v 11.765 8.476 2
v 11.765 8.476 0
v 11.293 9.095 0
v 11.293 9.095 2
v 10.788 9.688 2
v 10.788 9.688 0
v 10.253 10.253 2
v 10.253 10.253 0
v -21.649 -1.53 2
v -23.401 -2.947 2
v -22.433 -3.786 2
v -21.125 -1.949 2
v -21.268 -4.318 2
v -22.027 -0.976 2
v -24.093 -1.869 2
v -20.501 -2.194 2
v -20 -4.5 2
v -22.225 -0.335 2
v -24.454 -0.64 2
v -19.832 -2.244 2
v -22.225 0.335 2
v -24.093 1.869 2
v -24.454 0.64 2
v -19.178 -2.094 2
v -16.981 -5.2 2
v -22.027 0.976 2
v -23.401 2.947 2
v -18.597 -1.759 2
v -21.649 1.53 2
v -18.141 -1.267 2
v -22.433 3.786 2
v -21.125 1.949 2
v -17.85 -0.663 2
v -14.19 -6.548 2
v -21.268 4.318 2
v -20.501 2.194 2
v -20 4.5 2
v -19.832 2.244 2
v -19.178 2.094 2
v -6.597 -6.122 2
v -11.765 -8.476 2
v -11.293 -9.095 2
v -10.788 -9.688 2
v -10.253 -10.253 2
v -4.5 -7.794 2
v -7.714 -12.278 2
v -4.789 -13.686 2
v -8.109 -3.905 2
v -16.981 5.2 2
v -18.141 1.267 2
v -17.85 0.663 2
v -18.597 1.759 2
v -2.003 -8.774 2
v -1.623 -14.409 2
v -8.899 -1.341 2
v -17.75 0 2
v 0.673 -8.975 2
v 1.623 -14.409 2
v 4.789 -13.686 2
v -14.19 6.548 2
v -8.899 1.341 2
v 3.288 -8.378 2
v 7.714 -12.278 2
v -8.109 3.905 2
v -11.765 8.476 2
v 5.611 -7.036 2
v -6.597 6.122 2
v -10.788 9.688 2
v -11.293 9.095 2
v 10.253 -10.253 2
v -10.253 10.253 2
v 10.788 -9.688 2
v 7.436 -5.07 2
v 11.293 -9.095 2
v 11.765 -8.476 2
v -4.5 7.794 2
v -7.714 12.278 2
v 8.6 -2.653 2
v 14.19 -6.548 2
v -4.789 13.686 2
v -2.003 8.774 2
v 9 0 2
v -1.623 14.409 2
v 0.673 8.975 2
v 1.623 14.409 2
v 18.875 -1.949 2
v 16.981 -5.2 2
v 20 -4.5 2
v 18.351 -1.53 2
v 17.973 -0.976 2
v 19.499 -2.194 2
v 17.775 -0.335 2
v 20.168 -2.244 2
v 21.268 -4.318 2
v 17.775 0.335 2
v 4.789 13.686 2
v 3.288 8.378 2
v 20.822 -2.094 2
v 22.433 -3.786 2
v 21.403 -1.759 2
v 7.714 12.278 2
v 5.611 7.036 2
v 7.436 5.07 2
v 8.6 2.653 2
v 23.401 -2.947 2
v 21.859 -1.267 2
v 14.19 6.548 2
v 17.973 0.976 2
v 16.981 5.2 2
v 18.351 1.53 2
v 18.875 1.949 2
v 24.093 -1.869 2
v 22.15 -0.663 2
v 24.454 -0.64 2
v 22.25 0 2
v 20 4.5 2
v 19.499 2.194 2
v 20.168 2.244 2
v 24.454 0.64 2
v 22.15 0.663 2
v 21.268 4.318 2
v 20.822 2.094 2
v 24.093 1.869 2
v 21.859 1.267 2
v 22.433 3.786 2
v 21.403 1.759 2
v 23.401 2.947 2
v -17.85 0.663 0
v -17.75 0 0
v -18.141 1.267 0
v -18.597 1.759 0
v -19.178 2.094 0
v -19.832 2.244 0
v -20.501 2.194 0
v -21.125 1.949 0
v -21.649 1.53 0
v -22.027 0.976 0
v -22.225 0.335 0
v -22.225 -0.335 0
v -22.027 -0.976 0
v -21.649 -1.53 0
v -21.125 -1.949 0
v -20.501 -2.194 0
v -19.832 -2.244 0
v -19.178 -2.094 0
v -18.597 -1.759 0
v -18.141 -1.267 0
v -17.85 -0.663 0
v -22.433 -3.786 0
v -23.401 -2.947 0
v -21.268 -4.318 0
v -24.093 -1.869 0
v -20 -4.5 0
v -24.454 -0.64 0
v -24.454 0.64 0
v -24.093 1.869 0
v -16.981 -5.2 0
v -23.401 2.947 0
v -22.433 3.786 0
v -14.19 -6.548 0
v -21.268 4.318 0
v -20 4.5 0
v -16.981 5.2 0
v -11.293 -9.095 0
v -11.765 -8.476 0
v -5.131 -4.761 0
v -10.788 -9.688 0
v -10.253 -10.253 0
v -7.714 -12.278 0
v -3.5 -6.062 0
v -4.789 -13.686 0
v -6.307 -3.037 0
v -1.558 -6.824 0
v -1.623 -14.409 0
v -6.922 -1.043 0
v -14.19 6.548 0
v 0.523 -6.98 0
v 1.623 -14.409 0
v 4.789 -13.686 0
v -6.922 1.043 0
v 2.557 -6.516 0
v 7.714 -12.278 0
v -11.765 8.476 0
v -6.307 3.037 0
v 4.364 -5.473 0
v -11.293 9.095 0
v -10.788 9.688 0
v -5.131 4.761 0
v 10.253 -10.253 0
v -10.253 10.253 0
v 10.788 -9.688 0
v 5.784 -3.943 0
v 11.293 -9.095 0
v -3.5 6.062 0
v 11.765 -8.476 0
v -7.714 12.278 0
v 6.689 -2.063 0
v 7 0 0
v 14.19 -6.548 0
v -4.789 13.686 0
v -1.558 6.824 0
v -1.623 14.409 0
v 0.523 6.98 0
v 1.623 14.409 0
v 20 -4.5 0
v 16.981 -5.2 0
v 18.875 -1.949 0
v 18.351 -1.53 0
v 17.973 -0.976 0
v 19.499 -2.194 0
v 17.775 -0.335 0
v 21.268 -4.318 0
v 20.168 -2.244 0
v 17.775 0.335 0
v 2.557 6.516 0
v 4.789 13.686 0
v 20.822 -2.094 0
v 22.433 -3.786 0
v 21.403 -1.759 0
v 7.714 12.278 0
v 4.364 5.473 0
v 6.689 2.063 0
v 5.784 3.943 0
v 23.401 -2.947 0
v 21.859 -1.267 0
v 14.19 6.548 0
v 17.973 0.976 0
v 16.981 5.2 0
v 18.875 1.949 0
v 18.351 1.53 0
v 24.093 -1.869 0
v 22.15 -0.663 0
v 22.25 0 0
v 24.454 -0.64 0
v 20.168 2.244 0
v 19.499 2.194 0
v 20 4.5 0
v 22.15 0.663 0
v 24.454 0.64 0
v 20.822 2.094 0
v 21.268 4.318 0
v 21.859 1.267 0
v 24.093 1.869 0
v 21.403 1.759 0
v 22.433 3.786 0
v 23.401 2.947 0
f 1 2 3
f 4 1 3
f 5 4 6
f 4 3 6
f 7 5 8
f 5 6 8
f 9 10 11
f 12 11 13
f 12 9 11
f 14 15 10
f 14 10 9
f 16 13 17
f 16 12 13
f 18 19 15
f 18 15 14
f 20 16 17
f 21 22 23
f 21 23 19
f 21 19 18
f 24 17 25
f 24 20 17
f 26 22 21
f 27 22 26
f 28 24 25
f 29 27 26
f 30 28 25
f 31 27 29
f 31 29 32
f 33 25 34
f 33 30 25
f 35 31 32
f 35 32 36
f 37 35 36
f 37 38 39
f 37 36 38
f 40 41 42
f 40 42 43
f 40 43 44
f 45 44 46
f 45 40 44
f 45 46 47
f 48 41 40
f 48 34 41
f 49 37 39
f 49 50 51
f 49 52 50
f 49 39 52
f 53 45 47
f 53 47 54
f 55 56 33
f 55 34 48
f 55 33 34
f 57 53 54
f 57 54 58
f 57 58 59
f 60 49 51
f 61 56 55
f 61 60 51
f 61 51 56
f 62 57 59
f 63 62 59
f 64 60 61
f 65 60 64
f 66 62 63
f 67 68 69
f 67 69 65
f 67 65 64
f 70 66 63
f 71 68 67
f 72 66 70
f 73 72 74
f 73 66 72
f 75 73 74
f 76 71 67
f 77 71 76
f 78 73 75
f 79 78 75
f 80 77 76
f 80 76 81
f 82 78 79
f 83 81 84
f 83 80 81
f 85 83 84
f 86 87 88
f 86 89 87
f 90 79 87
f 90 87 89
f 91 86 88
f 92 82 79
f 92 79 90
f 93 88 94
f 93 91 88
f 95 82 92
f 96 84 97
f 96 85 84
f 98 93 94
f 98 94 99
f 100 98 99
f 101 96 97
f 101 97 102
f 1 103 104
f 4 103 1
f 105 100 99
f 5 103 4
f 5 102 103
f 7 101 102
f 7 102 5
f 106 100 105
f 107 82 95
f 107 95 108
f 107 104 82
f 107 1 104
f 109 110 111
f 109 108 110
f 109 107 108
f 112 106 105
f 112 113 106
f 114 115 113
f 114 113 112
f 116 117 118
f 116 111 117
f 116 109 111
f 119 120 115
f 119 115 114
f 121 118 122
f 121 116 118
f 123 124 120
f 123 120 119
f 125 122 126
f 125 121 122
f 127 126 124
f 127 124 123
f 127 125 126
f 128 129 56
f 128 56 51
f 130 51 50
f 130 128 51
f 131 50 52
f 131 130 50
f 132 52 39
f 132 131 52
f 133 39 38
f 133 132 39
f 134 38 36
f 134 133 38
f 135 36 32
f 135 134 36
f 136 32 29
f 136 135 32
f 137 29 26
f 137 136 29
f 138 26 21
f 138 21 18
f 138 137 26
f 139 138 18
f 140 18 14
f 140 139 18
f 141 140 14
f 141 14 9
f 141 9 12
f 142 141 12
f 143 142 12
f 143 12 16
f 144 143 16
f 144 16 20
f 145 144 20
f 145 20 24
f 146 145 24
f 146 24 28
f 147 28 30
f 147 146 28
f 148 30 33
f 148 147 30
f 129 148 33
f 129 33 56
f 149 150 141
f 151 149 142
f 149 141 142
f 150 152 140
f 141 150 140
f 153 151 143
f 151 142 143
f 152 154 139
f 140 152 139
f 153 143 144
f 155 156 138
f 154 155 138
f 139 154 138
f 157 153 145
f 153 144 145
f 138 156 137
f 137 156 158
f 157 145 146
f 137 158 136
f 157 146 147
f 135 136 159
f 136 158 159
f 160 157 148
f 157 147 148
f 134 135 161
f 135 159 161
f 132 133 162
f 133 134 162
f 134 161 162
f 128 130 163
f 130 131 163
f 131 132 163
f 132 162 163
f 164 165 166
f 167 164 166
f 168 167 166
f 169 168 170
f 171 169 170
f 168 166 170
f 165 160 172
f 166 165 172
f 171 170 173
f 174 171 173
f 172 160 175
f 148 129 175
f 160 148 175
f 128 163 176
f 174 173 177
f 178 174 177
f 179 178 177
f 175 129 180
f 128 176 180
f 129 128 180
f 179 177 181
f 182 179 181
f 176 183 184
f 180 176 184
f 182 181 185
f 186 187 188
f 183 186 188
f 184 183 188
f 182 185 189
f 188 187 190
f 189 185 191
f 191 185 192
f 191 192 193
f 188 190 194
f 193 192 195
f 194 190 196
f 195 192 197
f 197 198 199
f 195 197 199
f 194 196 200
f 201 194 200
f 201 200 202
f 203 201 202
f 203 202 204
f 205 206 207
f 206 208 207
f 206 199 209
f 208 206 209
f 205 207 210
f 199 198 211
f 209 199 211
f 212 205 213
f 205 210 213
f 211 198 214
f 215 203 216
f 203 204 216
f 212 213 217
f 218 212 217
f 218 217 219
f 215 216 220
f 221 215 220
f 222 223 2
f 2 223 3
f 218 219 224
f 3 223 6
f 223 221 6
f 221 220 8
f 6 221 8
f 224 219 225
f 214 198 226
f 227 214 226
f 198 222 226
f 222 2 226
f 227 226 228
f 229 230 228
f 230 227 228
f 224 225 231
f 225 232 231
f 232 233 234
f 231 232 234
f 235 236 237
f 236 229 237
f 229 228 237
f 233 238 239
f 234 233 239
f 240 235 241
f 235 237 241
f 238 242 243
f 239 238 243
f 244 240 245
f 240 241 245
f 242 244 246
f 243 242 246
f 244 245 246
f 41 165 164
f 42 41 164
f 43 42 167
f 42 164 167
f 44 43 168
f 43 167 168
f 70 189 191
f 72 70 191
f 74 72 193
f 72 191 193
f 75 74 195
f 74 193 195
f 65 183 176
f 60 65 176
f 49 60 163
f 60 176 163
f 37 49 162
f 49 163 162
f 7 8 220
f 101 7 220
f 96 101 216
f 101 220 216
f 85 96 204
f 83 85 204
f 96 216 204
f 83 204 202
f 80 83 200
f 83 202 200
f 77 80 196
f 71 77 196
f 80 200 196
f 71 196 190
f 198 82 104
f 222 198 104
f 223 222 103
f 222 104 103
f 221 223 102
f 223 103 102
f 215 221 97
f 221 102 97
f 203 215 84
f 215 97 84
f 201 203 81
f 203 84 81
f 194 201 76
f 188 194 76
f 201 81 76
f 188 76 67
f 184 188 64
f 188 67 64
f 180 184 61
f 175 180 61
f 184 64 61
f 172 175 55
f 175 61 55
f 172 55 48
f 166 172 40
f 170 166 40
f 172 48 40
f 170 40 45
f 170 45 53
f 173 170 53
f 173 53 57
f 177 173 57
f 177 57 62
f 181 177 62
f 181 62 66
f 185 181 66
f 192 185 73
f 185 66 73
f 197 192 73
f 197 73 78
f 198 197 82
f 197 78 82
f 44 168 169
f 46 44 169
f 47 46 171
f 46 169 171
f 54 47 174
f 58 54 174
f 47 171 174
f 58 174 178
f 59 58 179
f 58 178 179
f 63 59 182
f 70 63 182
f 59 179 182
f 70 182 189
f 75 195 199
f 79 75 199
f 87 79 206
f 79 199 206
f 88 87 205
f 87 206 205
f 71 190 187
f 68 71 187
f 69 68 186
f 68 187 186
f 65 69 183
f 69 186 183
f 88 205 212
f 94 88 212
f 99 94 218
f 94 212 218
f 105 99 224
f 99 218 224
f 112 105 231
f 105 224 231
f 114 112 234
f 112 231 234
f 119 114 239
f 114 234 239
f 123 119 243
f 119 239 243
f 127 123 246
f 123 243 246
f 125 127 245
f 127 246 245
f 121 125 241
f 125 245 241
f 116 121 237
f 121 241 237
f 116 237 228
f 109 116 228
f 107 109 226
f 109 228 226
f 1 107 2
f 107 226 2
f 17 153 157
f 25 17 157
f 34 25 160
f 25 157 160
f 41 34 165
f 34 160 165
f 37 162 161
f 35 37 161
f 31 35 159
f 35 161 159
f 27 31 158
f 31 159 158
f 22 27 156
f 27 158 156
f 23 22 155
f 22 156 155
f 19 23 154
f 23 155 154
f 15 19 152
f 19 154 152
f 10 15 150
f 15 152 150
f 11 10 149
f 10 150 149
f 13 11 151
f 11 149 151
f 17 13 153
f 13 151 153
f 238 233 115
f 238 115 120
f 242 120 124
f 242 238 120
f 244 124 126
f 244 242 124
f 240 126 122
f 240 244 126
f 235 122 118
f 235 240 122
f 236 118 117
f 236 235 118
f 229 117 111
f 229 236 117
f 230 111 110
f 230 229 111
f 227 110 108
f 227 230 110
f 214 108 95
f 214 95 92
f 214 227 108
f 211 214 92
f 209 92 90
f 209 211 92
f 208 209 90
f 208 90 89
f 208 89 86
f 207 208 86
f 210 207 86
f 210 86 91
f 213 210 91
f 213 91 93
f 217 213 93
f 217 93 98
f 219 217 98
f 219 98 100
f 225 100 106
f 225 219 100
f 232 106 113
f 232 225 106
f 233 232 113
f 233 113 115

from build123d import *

# Parameters (mm, degrees)
F0_R     = 7
F0_R_2   = 2.25
F1_DEPTH = 2
F2_SIZE  = 1.99999


# Not quite as in the source:
# - a fillet or chamfer is up to 0.001 mm smaller than in the source, because OpenCascade refuses the exact size


with BuildPart() as f1:
    # F0 (on Top) → F1 (new body)
    with BuildSketch(Plane.XY):
        with BuildLine():
            ThreePointArc((11.7645575334, 8.4761539653), (10.9717281133, 9.333063578), (10.2530483272, 10.2530483272))
            ThreePointArc((10.2530483272, 10.2530483272), (0, 14.5), (-10.2530483272, 10.2530483272))
            ThreePointArc((-10.2530483272, 10.2530483272), (-10.9717281133, 9.333063578), (-11.7645575334, 8.4761539653))
            ThreePointArc((-11.7645575334, 8.4761539653), (-14.5, 0), (-11.7645575334, -8.4761539653))
            ThreePointArc((-11.7645575334, -8.4761539653), (-10.9717281133, -9.333063578), (-10.2530483272, -10.2530483272))
            ThreePointArc((-10.2530483272, -10.2530483272), (0, -14.5), (10.2530483272, -10.2530483272))
            ThreePointArc((10.2530483272, -10.2530483272), (10.9717281133, -9.333063578), (11.7645575334, -8.4761539653))
            ThreePointArc((11.7645575334, -8.4761539653), (13.7992044016, -4.4533086445), (14.5, 0))
            ThreePointArc((14.5, 0), (13.7992044016, 4.4533086445), (11.7645575334, 8.4761539653))
        make_face()
        Circle(F0_R, mode=Mode.SUBTRACT)
        with BuildLine():
            ThreePointArc((11.7645575334, 8.4761539653), (11.0445950741, 9.3950476129), (10.2530483272, 10.2530483272))
            ThreePointArc((10.2530483272, 10.2530483272), (10.9717281133, 9.333063578), (11.7645575334, 8.4761539653))
        make_face()
        with BuildLine():
            ThreePointArc((-11.7645575334, 8.4761539653), (-10.9717281133, 9.333063578), (-10.2530483272, 10.2530483272))
            ThreePointArc((-10.2530483272, 10.2530483272), (-11.0445950741, 9.3950476129), (-11.7645575334, 8.4761539653))
        make_face()
        with BuildLine():
            ThreePointArc((20, 4.5), (15.5484628484, 5.7966747348), (11.7645575334, 8.4761539653))
            ThreePointArc((11.7645575334, 8.4761539653), (13.7992044016, 4.4533086445), (14.5, 0))
            ThreePointArc((14.5, 0), (13.7992044016, -4.4533086445), (11.7645575334, -8.4761539653))
            ThreePointArc((11.7645575334, -8.4761539653), (15.5484628484, -5.7966747348), (20, -4.5))
            ThreePointArc((20, -4.5), (24.5, 0), (20, 4.5))
        make_face()
        with Locations((20, 0)):
            Circle(F0_R_2, mode=Mode.SUBTRACT)
        with BuildLine():
            ThreePointArc((-11.7645575334, -8.4761539653), (-14.5, 0), (-11.7645575334, 8.4761539653))
            ThreePointArc((-11.7645575334, 8.4761539653), (-15.5484628484, 5.7966747348), (-20, 4.5))
            ThreePointArc((-20, 4.5), (-24.5, 0), (-20, -4.5))
            ThreePointArc((-20, -4.5), (-15.5484628484, -5.7966747348), (-11.7645575334, -8.4761539653))
        make_face()
        with Locations((-20, 0)):
            Circle(F0_R_2, mode=Mode.SUBTRACT)
        with BuildLine():
            ThreePointArc((-10.2530483272, -10.2530483272), (-10.9717281133, -9.333063578), (-11.7645575334, -8.4761539653))
            ThreePointArc((-11.7645575334, -8.4761539653), (-11.0445950741, -9.3950476129), (-10.2530483272, -10.2530483272))
        make_face()
        with BuildLine():
            ThreePointArc((10.2530483272, -10.2530483272), (11.0445950741, -9.3950476129), (11.7645575334, -8.4761539653))
            ThreePointArc((11.7645575334, -8.4761539653), (10.9717281133, -9.333063578), (10.2530483272, -10.2530483272))
        make_face()
    extrude(amount=F1_DEPTH)

    # F2 (size 2 in the source; OpenCascade refuses exactly that, so slightly less here)
    f2_edges = [f1.edges().sort_by_distance(p)[0] for p in [
        (-7, 0, 2),
    ]]
    chamfer(f2_edges, length=F2_SIZE)


solid = f1.part
